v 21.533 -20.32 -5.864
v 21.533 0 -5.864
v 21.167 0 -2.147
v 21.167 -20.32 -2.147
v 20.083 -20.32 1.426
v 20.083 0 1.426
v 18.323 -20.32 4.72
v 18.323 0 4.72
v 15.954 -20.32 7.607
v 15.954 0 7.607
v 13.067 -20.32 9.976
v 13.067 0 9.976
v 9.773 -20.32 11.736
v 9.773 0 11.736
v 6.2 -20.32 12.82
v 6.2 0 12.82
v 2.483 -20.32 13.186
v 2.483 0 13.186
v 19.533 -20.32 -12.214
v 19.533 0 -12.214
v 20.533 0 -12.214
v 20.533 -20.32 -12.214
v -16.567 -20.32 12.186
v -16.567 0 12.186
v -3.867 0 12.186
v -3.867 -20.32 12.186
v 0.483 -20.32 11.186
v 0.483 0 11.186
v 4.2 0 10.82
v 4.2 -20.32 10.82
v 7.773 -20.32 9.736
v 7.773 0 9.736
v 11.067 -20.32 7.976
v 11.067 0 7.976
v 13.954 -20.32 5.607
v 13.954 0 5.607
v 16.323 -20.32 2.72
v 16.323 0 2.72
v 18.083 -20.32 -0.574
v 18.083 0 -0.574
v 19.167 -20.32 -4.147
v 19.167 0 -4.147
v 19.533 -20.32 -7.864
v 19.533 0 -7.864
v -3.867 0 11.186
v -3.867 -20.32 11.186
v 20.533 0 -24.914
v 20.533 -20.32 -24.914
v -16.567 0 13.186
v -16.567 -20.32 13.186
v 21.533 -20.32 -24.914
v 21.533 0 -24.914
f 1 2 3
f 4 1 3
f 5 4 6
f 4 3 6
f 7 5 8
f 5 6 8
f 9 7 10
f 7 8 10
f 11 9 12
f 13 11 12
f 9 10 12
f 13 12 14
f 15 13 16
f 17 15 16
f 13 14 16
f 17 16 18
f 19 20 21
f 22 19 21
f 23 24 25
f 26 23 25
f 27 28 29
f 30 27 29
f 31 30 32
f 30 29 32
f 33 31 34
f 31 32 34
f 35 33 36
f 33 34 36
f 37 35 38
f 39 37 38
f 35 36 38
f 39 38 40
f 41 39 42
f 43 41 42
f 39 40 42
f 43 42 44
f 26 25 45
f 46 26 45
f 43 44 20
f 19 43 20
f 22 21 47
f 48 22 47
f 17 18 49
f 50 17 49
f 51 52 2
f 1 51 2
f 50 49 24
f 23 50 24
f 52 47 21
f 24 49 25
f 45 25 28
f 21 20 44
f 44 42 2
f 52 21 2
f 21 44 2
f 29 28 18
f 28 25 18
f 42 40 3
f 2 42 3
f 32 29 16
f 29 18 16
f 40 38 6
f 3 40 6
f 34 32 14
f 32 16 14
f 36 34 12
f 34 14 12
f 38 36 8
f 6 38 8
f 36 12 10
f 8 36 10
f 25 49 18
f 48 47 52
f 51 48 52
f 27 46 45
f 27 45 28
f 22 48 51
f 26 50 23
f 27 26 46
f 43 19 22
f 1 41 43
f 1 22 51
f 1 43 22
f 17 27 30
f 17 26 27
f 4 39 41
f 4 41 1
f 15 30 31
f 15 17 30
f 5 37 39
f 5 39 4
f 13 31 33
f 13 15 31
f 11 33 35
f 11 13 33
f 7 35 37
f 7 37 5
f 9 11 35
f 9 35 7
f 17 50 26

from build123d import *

# Parameters (mm, degrees)
F1_DEPTH = 20.32


with BuildPart() as f1:
    # F0 (on Front) → F1 (new body)
    with BuildSketch(Plane.XZ):
        with BuildLine():
            Line((2.483238, 13.186188), (-3.866762, 13.186188))
            Line((-3.866762, 13.186188), (-16.566762, 13.186188))
            Line((-16.566762, 13.186188), (-16.566762, 12.186188))
            Line((-16.566762, 12.186188), (-3.866762, 12.186188))
            Line((-3.866762, 12.186188), (-3.866762, 11.186188))
            Line((-3.866762, 11.186188), (0.483238, 11.186188))
            ThreePointArc((0.483238, 11.186188), (13.953622, 5.606572), (19.533238, -7.863812))
            Line((19.533238, -7.863812), (19.533238, -12.213812))
            Line((19.533238, -12.213812), (20.533238, -12.213812))
            Line((20.533238, -12.213812), (20.533238, -24.913812))
            Line((20.533238, -24.913812), (21.533238, -24.913812))
            Line((21.533238, -24.913812), (21.533238, -12.213812))
            Line((21.533238, -12.213812), (21.533238, -5.863812))
            ThreePointArc((21.533238, -5.863812), (15.953622, 7.606572), (2.483238, 13.186188))
        make_face()
    extrude(amount=F1_DEPTH)


solid = f1.part
